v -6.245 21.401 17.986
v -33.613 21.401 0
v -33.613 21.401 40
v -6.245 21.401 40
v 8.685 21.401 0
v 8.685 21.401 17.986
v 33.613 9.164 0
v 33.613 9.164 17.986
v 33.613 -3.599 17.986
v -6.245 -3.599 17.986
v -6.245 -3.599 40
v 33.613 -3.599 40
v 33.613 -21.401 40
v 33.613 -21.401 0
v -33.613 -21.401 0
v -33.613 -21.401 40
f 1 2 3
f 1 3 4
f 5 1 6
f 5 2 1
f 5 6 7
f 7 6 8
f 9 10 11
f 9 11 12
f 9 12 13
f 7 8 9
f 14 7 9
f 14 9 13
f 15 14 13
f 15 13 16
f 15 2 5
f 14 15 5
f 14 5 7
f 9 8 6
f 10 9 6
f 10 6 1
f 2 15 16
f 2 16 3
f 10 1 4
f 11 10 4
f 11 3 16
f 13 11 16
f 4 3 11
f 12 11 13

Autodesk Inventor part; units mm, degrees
ref_plane "YZ Plane" through (0, 0, 0) normal (1, 0, 0) x (0, 1, 0)
ref_plane "XZ Plane" through (0, 0, 0) normal (0, 1, 0) x (-1, 0, 0)
ref_plane "XY Plane" through (0, 0, 0) normal (0, 0, 1) x (1, 0, 0)
sketch "스케치1" plane through (0, 0, 0) normal (0, 0, 1) x (1, 0, 0)
  line L0 (33.6127, -21.4008) -> (-33.6127, -21.4008)
  line L1 (-33.6127, -21.4008) -> (-33.6127, 21.4008)
  line L2 (-33.6127, 21.4008) -> (33.6127, 21.4008)
  line L3 (33.6127, 21.4008) -> (33.6127, -21.4008)
  line L4 (33.6127, -21.4008) -> (-33.6127, 21.4008) construction
  line L5 (-33.6127, -21.4008) -> (33.6127, 21.4008) construction
  point P0 (0, 0)
extrude "돌출1" add sketch "스케치1" along normal blind 40
sketch "스케치2" plane through (-33.6127, 21.4008, 0) normal (0, 1, 0) x (1, 0, 0)
  line L0 (67.2253, 0) -> (67.2253, -40) projected
  line L1 (0, -40) -> (67.2253, -40) projected
  line L2 (67.2253, -17.9861) -> (27.3679, -17.9861)
  line L3 (27.3679, -17.9861) -> (27.3679, -40)
  line L4 (27.3679, -40) -> (67.2253, -40)
  line L5 (67.2253, -40) -> (67.2253, -17.9861)
  point P0 (33.6127, 0)
extrude "돌출2" cut sketch "스케치2" against normal blind 25
sketch "스케치3" plane through (-6.2447, 21.4008, 17.9861) normal (0, 0, 1) x (1, 0, 0)
  point P0 (6.2447, -21.4008)
sketch "스케치4" plane through (-6.2447, 21.4008, 17.9861) normal (0, 0, 1) x (1, 0, 0)
  point P0 (6.2447, -21.4008)
sketch "스케치5" plane through (-6.2447, 21.4008, 17.9861) normal (0, 0, 1) x (1, 0, 0)
  point P0 (6.2447, -21.4008)
sketch "스케치6" plane through (-33.6127, 21.4008, 0) normal (0, 1, 0) x (1, 0, 0)
  line L0 (27.3679, -17.9861) -> (67.2253, -17.9861) projected
  line L1 (0, 0) -> (67.2253, 0) projected
  line L2 (67.2253, -17.9861) -> (39.8016, -17.9861)
  line L3 (39.8016, -17.9861) -> (39.8016, 0)
  line L4 (39.8016, 0) -> (67.2253, 0)
  line L5 (67.2253, 0) -> (67.2253, -17.9861)
  point P0 (33.6127, 0)
sketch "스케치7" plane through (-6.2447, 21.4008, 17.9861) normal (0, 0, 1) x (1, 0, 0)
  line L0 (-27.3679, 0) -> (39.8574, 0) projected
  line L1 (14.9296, 0) -> (39.8574, -12.2366)
  line L2 (39.8574, 0) -> (39.8574, -42.8017) projected
  point P0 (6.2447, -21.4008)
extrude "돌출3" cut sketch "스케치7" against normal blind 20
sketch "스케치8" plane through (0, 0, 40) normal (0, 0, 1) x (1, 0, 0)
  point P0 (0, 0)
properties part number "240503_3Dsketch04"
